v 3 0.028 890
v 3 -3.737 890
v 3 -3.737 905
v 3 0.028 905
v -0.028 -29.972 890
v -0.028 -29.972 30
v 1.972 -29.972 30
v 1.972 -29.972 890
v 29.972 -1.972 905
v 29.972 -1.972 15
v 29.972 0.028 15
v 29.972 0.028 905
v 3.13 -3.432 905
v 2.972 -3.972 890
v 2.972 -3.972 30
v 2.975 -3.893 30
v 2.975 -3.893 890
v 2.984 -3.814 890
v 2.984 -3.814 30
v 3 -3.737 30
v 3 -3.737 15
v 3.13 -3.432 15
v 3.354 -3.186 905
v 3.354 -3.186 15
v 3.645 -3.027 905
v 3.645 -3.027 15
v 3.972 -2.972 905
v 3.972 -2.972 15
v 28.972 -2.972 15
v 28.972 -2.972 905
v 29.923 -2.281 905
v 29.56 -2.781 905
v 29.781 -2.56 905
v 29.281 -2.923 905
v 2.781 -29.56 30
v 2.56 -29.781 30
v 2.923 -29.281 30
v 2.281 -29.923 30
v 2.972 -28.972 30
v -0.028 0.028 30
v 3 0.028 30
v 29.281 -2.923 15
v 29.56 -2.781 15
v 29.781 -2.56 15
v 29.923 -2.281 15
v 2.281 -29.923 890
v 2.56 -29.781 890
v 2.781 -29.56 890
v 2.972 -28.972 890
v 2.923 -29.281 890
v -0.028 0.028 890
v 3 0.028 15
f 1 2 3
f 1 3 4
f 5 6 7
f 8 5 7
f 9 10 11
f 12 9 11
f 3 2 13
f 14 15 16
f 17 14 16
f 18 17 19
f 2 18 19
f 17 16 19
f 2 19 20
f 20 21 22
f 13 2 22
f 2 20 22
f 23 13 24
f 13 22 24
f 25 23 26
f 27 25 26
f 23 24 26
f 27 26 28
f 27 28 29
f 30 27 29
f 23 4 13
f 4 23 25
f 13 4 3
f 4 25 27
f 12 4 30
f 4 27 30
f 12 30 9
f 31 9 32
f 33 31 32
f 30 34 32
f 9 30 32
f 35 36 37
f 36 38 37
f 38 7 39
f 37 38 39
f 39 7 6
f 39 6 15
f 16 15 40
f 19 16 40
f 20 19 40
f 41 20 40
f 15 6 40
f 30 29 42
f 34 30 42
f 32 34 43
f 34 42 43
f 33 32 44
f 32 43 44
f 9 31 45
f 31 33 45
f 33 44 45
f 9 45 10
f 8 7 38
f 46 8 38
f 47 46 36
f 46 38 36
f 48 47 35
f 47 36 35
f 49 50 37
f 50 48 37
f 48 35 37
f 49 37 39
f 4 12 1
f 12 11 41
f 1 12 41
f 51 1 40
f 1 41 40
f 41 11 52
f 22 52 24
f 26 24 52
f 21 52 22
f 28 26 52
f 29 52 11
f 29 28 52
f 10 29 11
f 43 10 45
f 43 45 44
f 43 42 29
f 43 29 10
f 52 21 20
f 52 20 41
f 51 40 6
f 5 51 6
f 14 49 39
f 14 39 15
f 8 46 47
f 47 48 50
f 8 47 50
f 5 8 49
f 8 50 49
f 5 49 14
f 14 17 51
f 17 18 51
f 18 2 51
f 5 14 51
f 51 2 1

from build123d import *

# Parameters (mm, degrees)
F1_DEPTH      = 920
F2_W          = 32.354593277
F2_H          = 26.2916557118
F3_DEPTH      = 25
F3_DEPTH_BACK = 25
F4_W          = 93.2869557291
F4_H          = 71.5390760452
F5_DEPTH      = 3
F5_DEPTH_BACK = 25


with BuildPart() as f1:
    # F0 (on Top) → F1 (new body)
    with BuildSketch(Plane.XY):
        with BuildLine():
            Line((29.9719494759, 0.0280495928), (-0.0280505241, 0.0280495928))
            Line((-0.0280505241, 0.0280495928), (-0.0280505241, -29.9719504072))
            Line((-0.0280505241, -29.9719504072), (1.9719494759, -29.9719504072))
            ThreePointArc((1.9719494759, -29.9719504072), (2.679056257, -29.6790571884), (2.9719494759, -28.9719504072))
            Line((2.9719494759, -28.9719504072), (2.9719494759, -3.9719504072))
            ThreePointArc((2.9719494759, -3.9719504072), (3.2648426947, -3.264843626), (3.9719494759, -2.9719504072))
            Line((3.9719494759, -2.9719504072), (28.9719494759, -2.9719504072))
            ThreePointArc((28.9719494759, -2.9719504072), (29.679056257, -2.6790571884), (29.9719494759, -1.9719504072))
            Line((29.9719494759, -1.9719504072), (29.9719494759, 0.0280495928))
        make_face()
    extrude(amount=F1_DEPTH)

    # F2 (on Front) → F3 (cut, two sides)
    with BuildSketch(Plane.XZ) as f3_sk:
        with Locations((19.1772966385, 1.8541721441)):
            Rectangle(F2_W, F2_H)
        with Locations((19.1772966385, 918.1458278559)):
            Rectangle(F2_W, F2_H)
    extrude(amount=F3_DEPTH, mode=Mode.SUBTRACT)
    extrude(f3_sk.sketch, amount=-F3_DEPTH_BACK, mode=Mode.SUBTRACT)

    # F4 (on Right) → F5 (cut, two sides)
    with BuildSketch(Plane.YZ) as f5_sk:
        with Locations((-15.7623803243, -5.7695380226)):
            Rectangle(F4_W, F4_H)
        with Locations((-15.7623803243, 925.7695380226)):
            Rectangle(F4_W, F4_H)
    extrude(amount=F5_DEPTH, mode=Mode.SUBTRACT)
    extrude(f5_sk.sketch, amount=-F5_DEPTH_BACK, mode=Mode.SUBTRACT)


solid = f1.part
